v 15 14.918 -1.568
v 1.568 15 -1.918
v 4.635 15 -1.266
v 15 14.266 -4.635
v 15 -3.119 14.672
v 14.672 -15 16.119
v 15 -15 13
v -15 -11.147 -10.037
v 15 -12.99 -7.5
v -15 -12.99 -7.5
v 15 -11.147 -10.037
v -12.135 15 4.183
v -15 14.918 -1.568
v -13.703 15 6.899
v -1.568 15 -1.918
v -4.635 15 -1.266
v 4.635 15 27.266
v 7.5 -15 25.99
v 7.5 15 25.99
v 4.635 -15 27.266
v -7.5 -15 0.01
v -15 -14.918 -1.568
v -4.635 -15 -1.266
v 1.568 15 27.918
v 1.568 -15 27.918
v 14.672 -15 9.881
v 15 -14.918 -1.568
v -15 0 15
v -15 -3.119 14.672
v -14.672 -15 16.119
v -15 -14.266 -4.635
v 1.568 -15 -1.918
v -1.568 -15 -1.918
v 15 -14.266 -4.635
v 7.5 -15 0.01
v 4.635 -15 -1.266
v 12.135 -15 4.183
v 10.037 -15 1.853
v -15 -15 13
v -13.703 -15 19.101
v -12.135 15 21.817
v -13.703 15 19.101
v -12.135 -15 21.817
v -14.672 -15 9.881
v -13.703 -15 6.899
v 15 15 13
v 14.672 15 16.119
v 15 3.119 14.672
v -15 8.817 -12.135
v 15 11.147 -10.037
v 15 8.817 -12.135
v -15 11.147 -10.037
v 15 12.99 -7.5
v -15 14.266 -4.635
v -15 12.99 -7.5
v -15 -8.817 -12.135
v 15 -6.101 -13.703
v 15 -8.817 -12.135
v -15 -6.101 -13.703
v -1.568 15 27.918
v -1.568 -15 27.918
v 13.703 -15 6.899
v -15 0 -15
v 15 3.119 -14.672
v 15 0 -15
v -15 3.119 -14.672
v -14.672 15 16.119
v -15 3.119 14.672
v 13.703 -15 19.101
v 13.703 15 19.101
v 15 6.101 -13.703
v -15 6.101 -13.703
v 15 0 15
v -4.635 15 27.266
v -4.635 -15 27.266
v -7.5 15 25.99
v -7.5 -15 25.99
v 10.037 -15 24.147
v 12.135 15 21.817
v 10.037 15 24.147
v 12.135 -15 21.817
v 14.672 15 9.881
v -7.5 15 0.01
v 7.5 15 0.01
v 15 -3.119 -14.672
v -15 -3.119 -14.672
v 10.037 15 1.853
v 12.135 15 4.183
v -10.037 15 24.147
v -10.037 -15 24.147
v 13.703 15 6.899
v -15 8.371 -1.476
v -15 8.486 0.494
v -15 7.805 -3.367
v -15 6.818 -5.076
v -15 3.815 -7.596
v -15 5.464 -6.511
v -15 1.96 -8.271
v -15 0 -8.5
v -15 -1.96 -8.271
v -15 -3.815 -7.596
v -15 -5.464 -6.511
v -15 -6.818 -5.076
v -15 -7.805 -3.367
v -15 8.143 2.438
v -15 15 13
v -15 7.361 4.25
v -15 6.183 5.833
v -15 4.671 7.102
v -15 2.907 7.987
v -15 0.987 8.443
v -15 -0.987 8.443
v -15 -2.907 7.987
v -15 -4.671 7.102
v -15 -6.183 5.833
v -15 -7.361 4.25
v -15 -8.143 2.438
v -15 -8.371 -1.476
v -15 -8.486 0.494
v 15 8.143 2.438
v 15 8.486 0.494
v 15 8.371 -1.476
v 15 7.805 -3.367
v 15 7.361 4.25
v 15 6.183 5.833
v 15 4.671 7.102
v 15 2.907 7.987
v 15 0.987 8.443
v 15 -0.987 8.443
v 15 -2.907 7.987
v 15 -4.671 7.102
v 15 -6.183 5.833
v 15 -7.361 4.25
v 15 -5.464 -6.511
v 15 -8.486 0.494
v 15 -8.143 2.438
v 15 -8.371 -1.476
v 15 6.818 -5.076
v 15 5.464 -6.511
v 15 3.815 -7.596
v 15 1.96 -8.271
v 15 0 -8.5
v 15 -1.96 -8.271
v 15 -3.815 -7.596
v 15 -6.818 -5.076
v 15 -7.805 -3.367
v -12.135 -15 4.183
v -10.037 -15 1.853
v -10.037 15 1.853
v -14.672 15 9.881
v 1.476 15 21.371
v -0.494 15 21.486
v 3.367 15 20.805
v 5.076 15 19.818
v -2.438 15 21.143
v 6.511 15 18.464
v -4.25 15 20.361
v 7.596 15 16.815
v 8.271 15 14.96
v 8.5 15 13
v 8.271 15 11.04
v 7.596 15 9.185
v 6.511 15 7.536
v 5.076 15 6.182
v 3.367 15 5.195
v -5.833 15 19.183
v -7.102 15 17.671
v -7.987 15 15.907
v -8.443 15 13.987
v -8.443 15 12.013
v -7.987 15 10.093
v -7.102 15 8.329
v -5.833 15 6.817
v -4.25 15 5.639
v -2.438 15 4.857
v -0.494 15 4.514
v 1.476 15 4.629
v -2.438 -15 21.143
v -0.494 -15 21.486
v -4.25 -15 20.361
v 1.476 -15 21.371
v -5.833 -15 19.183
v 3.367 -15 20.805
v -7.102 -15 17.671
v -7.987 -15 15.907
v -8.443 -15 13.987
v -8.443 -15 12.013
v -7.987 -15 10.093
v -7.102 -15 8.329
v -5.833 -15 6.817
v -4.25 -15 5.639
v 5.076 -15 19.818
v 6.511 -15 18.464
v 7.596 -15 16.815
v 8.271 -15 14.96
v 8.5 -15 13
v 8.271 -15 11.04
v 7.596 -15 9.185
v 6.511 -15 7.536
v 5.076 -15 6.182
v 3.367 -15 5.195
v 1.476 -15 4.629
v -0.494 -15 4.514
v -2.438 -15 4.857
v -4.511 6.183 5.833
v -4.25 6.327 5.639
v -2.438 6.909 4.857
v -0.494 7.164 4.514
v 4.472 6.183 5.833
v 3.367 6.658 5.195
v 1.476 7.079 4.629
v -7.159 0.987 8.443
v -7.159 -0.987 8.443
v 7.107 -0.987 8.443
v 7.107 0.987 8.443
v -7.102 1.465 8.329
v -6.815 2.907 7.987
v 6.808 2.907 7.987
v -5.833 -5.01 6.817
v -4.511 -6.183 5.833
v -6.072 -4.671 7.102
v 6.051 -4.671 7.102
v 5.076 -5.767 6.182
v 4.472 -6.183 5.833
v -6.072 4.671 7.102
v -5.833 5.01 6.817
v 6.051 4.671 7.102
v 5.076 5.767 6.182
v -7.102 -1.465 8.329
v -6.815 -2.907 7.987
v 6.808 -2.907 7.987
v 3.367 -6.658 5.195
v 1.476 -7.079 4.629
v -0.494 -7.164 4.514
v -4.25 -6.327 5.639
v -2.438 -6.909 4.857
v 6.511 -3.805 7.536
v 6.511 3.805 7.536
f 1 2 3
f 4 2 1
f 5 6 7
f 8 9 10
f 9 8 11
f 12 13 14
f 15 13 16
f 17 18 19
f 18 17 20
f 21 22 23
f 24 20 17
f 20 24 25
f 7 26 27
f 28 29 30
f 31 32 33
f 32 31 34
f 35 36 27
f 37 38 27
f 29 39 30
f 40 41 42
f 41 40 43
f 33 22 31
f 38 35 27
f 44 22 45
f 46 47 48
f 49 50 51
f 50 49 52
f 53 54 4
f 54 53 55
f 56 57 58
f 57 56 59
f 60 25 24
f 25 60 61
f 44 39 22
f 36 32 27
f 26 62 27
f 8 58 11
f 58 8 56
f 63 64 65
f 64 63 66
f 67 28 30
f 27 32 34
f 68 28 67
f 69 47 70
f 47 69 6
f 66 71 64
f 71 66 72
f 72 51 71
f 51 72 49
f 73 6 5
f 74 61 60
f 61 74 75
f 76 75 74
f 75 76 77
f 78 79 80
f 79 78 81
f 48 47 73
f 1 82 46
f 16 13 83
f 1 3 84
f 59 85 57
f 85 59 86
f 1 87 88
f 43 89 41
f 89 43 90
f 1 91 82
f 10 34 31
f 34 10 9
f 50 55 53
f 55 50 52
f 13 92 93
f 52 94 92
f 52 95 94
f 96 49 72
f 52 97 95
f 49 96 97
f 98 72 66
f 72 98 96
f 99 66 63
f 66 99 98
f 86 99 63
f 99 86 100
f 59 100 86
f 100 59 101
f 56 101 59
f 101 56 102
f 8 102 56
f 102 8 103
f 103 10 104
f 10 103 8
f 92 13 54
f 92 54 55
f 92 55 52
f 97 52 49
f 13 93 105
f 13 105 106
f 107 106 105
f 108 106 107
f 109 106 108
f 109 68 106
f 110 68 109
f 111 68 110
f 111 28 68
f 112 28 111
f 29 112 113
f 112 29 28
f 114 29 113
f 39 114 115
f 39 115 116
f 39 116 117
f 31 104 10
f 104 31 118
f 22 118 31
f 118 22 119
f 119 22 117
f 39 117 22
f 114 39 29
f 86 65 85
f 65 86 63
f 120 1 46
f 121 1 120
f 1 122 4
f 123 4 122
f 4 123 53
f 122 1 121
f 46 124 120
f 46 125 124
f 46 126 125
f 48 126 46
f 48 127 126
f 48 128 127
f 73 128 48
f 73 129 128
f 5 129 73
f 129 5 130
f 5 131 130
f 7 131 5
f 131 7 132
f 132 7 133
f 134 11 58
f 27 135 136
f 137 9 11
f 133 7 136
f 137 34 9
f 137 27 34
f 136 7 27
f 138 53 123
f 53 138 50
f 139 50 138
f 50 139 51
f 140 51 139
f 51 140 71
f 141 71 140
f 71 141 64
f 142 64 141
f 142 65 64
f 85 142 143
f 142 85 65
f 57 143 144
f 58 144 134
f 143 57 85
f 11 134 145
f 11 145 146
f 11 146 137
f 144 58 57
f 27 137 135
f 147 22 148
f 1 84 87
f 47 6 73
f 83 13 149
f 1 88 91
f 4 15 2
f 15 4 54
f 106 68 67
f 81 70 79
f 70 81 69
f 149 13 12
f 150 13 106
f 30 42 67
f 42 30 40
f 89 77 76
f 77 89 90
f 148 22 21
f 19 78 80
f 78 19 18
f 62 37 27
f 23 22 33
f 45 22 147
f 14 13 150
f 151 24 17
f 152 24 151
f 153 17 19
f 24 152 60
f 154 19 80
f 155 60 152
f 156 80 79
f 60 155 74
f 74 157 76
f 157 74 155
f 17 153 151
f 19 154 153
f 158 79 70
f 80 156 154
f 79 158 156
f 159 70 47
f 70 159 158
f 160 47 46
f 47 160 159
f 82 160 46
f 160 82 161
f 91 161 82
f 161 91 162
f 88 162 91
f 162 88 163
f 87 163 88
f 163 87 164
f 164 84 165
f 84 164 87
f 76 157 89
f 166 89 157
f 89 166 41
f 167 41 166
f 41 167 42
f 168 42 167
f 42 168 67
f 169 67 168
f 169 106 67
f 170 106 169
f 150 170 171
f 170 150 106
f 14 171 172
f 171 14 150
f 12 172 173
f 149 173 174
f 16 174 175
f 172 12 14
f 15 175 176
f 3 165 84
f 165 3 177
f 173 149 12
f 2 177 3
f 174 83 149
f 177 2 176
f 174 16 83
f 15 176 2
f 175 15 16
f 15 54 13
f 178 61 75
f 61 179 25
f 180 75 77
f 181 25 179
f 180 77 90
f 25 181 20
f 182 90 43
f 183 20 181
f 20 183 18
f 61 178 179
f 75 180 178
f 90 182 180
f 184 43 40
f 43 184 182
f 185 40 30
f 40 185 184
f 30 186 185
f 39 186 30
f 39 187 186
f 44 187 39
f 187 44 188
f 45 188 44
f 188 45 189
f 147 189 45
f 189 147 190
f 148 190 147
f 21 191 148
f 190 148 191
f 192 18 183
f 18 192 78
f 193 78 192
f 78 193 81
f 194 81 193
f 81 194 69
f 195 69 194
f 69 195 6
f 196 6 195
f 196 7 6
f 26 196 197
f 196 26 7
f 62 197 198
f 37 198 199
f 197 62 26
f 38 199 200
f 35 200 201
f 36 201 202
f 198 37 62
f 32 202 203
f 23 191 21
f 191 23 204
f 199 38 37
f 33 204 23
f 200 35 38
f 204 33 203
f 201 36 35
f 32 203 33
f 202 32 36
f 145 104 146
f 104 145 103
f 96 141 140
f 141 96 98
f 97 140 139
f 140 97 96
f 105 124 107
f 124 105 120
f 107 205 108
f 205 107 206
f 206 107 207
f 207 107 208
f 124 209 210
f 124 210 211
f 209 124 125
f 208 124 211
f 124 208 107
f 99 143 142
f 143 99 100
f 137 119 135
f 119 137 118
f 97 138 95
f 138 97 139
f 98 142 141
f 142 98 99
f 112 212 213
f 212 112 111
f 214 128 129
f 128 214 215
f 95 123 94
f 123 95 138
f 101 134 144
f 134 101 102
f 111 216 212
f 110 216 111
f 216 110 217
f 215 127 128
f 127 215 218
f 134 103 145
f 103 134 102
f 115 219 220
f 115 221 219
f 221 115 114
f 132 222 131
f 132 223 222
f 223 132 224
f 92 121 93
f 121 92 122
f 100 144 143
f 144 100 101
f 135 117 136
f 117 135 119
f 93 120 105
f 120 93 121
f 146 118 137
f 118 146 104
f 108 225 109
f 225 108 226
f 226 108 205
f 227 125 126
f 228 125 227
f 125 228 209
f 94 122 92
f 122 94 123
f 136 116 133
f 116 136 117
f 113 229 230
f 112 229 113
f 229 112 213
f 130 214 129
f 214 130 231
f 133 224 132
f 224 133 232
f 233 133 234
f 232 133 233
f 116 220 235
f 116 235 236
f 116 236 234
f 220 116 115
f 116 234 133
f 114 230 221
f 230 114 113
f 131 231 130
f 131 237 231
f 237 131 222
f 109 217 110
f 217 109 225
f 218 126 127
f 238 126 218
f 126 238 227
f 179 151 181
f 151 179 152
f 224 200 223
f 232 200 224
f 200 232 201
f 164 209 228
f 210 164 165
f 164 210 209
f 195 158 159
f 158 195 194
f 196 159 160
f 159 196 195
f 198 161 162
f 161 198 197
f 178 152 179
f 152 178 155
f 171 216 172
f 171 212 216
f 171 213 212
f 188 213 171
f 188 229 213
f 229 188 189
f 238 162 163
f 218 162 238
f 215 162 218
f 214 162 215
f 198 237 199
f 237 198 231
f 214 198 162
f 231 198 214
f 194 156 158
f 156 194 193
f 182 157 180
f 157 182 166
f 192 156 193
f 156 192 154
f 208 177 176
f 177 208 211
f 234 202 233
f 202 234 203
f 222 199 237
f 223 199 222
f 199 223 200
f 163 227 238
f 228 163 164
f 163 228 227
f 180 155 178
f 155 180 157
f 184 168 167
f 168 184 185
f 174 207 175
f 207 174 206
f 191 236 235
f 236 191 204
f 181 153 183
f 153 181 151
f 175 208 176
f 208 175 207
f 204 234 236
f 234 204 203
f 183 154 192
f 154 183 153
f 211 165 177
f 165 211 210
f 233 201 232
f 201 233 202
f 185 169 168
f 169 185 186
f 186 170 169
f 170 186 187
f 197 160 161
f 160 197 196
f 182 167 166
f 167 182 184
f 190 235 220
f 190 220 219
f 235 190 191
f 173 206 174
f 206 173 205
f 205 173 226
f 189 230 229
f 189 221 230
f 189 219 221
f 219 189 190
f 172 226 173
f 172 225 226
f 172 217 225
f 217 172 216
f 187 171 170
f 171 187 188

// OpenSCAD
// file: variables.scad
// General
DIFFERENCE_FIX = 0.1;
DIFFERENCE_FIX_NEGATIVE = -1 * DIFFERENCE_FIX;
DIFFERENCE_FIX_2 = 2 * DIFFERENCE_FIX;

// Hull
hullThickness = 3;

// Nose
noseLength = 100;
noseWidth = 70 - hullThickness * 2;

noseTopThickness = 1;
noseTopOffsetZ = 60;
noseTopEndOffset = 20;

// Hull
hullLength = 500 - hullThickness * 2;
hullSpacing = 100;
hullCutoutWidth = 46;
hullCutoutHeight = 150;
hullHeight = noseTopOffsetZ + noseTopThickness + hullThickness;

// Higher means thicker
noseTopSharpnessFactor = 4;
noseBotttomSharpnessFactor = 3;

noseTopThicknessFactor = 1;
noseBottomThicknessFactor = 3;

// Hull Mounts
hullMountHole = 8.5;
hullMountHeight = 30;
hullMountWidth = 30;
hullMountDepth = 50;
hullMountPinRadius = 5;
hullMountPinOffset = 10;
hullMountOffsetY = 100;

// Rod Connectors
rodConnectorWidth = 30;
rodConnectorRadius = 15;
rodConnectorTopOffset = 2;
rodConnectorOffsetX = 30;
// main file
include <variables.scad>

module rodConnector() {
    difference() {
        hull() union() {
            // Lower cylinder
            rotate([0, 90, 0])
            cylinder(h = rodConnectorWidth, r = rodConnectorRadius, center = true);

            // Upper cylinder
            translate([0, 0 , rodConnectorRadius - rodConnectorTopOffset])
            rotate([90, 0, 0])
            cylinder(h = rodConnectorWidth, r = rodConnectorRadius, center = true);
        }

        // Lower cutout
        rotate([0, 90, 0])
        cylinder(h = rodConnectorWidth + DIFFERENCE_FIX_2, r = hullMountHole, center = true);

        // Upper cutout
        translate([0, 0 , rodConnectorRadius - rodConnectorTopOffset])
        rotate([90, 0, 0])
        cylinder(h = rodConnectorWidth + DIFFERENCE_FIX_2, r = hullMountHole, center = true);
    }

}

rodConnector();
